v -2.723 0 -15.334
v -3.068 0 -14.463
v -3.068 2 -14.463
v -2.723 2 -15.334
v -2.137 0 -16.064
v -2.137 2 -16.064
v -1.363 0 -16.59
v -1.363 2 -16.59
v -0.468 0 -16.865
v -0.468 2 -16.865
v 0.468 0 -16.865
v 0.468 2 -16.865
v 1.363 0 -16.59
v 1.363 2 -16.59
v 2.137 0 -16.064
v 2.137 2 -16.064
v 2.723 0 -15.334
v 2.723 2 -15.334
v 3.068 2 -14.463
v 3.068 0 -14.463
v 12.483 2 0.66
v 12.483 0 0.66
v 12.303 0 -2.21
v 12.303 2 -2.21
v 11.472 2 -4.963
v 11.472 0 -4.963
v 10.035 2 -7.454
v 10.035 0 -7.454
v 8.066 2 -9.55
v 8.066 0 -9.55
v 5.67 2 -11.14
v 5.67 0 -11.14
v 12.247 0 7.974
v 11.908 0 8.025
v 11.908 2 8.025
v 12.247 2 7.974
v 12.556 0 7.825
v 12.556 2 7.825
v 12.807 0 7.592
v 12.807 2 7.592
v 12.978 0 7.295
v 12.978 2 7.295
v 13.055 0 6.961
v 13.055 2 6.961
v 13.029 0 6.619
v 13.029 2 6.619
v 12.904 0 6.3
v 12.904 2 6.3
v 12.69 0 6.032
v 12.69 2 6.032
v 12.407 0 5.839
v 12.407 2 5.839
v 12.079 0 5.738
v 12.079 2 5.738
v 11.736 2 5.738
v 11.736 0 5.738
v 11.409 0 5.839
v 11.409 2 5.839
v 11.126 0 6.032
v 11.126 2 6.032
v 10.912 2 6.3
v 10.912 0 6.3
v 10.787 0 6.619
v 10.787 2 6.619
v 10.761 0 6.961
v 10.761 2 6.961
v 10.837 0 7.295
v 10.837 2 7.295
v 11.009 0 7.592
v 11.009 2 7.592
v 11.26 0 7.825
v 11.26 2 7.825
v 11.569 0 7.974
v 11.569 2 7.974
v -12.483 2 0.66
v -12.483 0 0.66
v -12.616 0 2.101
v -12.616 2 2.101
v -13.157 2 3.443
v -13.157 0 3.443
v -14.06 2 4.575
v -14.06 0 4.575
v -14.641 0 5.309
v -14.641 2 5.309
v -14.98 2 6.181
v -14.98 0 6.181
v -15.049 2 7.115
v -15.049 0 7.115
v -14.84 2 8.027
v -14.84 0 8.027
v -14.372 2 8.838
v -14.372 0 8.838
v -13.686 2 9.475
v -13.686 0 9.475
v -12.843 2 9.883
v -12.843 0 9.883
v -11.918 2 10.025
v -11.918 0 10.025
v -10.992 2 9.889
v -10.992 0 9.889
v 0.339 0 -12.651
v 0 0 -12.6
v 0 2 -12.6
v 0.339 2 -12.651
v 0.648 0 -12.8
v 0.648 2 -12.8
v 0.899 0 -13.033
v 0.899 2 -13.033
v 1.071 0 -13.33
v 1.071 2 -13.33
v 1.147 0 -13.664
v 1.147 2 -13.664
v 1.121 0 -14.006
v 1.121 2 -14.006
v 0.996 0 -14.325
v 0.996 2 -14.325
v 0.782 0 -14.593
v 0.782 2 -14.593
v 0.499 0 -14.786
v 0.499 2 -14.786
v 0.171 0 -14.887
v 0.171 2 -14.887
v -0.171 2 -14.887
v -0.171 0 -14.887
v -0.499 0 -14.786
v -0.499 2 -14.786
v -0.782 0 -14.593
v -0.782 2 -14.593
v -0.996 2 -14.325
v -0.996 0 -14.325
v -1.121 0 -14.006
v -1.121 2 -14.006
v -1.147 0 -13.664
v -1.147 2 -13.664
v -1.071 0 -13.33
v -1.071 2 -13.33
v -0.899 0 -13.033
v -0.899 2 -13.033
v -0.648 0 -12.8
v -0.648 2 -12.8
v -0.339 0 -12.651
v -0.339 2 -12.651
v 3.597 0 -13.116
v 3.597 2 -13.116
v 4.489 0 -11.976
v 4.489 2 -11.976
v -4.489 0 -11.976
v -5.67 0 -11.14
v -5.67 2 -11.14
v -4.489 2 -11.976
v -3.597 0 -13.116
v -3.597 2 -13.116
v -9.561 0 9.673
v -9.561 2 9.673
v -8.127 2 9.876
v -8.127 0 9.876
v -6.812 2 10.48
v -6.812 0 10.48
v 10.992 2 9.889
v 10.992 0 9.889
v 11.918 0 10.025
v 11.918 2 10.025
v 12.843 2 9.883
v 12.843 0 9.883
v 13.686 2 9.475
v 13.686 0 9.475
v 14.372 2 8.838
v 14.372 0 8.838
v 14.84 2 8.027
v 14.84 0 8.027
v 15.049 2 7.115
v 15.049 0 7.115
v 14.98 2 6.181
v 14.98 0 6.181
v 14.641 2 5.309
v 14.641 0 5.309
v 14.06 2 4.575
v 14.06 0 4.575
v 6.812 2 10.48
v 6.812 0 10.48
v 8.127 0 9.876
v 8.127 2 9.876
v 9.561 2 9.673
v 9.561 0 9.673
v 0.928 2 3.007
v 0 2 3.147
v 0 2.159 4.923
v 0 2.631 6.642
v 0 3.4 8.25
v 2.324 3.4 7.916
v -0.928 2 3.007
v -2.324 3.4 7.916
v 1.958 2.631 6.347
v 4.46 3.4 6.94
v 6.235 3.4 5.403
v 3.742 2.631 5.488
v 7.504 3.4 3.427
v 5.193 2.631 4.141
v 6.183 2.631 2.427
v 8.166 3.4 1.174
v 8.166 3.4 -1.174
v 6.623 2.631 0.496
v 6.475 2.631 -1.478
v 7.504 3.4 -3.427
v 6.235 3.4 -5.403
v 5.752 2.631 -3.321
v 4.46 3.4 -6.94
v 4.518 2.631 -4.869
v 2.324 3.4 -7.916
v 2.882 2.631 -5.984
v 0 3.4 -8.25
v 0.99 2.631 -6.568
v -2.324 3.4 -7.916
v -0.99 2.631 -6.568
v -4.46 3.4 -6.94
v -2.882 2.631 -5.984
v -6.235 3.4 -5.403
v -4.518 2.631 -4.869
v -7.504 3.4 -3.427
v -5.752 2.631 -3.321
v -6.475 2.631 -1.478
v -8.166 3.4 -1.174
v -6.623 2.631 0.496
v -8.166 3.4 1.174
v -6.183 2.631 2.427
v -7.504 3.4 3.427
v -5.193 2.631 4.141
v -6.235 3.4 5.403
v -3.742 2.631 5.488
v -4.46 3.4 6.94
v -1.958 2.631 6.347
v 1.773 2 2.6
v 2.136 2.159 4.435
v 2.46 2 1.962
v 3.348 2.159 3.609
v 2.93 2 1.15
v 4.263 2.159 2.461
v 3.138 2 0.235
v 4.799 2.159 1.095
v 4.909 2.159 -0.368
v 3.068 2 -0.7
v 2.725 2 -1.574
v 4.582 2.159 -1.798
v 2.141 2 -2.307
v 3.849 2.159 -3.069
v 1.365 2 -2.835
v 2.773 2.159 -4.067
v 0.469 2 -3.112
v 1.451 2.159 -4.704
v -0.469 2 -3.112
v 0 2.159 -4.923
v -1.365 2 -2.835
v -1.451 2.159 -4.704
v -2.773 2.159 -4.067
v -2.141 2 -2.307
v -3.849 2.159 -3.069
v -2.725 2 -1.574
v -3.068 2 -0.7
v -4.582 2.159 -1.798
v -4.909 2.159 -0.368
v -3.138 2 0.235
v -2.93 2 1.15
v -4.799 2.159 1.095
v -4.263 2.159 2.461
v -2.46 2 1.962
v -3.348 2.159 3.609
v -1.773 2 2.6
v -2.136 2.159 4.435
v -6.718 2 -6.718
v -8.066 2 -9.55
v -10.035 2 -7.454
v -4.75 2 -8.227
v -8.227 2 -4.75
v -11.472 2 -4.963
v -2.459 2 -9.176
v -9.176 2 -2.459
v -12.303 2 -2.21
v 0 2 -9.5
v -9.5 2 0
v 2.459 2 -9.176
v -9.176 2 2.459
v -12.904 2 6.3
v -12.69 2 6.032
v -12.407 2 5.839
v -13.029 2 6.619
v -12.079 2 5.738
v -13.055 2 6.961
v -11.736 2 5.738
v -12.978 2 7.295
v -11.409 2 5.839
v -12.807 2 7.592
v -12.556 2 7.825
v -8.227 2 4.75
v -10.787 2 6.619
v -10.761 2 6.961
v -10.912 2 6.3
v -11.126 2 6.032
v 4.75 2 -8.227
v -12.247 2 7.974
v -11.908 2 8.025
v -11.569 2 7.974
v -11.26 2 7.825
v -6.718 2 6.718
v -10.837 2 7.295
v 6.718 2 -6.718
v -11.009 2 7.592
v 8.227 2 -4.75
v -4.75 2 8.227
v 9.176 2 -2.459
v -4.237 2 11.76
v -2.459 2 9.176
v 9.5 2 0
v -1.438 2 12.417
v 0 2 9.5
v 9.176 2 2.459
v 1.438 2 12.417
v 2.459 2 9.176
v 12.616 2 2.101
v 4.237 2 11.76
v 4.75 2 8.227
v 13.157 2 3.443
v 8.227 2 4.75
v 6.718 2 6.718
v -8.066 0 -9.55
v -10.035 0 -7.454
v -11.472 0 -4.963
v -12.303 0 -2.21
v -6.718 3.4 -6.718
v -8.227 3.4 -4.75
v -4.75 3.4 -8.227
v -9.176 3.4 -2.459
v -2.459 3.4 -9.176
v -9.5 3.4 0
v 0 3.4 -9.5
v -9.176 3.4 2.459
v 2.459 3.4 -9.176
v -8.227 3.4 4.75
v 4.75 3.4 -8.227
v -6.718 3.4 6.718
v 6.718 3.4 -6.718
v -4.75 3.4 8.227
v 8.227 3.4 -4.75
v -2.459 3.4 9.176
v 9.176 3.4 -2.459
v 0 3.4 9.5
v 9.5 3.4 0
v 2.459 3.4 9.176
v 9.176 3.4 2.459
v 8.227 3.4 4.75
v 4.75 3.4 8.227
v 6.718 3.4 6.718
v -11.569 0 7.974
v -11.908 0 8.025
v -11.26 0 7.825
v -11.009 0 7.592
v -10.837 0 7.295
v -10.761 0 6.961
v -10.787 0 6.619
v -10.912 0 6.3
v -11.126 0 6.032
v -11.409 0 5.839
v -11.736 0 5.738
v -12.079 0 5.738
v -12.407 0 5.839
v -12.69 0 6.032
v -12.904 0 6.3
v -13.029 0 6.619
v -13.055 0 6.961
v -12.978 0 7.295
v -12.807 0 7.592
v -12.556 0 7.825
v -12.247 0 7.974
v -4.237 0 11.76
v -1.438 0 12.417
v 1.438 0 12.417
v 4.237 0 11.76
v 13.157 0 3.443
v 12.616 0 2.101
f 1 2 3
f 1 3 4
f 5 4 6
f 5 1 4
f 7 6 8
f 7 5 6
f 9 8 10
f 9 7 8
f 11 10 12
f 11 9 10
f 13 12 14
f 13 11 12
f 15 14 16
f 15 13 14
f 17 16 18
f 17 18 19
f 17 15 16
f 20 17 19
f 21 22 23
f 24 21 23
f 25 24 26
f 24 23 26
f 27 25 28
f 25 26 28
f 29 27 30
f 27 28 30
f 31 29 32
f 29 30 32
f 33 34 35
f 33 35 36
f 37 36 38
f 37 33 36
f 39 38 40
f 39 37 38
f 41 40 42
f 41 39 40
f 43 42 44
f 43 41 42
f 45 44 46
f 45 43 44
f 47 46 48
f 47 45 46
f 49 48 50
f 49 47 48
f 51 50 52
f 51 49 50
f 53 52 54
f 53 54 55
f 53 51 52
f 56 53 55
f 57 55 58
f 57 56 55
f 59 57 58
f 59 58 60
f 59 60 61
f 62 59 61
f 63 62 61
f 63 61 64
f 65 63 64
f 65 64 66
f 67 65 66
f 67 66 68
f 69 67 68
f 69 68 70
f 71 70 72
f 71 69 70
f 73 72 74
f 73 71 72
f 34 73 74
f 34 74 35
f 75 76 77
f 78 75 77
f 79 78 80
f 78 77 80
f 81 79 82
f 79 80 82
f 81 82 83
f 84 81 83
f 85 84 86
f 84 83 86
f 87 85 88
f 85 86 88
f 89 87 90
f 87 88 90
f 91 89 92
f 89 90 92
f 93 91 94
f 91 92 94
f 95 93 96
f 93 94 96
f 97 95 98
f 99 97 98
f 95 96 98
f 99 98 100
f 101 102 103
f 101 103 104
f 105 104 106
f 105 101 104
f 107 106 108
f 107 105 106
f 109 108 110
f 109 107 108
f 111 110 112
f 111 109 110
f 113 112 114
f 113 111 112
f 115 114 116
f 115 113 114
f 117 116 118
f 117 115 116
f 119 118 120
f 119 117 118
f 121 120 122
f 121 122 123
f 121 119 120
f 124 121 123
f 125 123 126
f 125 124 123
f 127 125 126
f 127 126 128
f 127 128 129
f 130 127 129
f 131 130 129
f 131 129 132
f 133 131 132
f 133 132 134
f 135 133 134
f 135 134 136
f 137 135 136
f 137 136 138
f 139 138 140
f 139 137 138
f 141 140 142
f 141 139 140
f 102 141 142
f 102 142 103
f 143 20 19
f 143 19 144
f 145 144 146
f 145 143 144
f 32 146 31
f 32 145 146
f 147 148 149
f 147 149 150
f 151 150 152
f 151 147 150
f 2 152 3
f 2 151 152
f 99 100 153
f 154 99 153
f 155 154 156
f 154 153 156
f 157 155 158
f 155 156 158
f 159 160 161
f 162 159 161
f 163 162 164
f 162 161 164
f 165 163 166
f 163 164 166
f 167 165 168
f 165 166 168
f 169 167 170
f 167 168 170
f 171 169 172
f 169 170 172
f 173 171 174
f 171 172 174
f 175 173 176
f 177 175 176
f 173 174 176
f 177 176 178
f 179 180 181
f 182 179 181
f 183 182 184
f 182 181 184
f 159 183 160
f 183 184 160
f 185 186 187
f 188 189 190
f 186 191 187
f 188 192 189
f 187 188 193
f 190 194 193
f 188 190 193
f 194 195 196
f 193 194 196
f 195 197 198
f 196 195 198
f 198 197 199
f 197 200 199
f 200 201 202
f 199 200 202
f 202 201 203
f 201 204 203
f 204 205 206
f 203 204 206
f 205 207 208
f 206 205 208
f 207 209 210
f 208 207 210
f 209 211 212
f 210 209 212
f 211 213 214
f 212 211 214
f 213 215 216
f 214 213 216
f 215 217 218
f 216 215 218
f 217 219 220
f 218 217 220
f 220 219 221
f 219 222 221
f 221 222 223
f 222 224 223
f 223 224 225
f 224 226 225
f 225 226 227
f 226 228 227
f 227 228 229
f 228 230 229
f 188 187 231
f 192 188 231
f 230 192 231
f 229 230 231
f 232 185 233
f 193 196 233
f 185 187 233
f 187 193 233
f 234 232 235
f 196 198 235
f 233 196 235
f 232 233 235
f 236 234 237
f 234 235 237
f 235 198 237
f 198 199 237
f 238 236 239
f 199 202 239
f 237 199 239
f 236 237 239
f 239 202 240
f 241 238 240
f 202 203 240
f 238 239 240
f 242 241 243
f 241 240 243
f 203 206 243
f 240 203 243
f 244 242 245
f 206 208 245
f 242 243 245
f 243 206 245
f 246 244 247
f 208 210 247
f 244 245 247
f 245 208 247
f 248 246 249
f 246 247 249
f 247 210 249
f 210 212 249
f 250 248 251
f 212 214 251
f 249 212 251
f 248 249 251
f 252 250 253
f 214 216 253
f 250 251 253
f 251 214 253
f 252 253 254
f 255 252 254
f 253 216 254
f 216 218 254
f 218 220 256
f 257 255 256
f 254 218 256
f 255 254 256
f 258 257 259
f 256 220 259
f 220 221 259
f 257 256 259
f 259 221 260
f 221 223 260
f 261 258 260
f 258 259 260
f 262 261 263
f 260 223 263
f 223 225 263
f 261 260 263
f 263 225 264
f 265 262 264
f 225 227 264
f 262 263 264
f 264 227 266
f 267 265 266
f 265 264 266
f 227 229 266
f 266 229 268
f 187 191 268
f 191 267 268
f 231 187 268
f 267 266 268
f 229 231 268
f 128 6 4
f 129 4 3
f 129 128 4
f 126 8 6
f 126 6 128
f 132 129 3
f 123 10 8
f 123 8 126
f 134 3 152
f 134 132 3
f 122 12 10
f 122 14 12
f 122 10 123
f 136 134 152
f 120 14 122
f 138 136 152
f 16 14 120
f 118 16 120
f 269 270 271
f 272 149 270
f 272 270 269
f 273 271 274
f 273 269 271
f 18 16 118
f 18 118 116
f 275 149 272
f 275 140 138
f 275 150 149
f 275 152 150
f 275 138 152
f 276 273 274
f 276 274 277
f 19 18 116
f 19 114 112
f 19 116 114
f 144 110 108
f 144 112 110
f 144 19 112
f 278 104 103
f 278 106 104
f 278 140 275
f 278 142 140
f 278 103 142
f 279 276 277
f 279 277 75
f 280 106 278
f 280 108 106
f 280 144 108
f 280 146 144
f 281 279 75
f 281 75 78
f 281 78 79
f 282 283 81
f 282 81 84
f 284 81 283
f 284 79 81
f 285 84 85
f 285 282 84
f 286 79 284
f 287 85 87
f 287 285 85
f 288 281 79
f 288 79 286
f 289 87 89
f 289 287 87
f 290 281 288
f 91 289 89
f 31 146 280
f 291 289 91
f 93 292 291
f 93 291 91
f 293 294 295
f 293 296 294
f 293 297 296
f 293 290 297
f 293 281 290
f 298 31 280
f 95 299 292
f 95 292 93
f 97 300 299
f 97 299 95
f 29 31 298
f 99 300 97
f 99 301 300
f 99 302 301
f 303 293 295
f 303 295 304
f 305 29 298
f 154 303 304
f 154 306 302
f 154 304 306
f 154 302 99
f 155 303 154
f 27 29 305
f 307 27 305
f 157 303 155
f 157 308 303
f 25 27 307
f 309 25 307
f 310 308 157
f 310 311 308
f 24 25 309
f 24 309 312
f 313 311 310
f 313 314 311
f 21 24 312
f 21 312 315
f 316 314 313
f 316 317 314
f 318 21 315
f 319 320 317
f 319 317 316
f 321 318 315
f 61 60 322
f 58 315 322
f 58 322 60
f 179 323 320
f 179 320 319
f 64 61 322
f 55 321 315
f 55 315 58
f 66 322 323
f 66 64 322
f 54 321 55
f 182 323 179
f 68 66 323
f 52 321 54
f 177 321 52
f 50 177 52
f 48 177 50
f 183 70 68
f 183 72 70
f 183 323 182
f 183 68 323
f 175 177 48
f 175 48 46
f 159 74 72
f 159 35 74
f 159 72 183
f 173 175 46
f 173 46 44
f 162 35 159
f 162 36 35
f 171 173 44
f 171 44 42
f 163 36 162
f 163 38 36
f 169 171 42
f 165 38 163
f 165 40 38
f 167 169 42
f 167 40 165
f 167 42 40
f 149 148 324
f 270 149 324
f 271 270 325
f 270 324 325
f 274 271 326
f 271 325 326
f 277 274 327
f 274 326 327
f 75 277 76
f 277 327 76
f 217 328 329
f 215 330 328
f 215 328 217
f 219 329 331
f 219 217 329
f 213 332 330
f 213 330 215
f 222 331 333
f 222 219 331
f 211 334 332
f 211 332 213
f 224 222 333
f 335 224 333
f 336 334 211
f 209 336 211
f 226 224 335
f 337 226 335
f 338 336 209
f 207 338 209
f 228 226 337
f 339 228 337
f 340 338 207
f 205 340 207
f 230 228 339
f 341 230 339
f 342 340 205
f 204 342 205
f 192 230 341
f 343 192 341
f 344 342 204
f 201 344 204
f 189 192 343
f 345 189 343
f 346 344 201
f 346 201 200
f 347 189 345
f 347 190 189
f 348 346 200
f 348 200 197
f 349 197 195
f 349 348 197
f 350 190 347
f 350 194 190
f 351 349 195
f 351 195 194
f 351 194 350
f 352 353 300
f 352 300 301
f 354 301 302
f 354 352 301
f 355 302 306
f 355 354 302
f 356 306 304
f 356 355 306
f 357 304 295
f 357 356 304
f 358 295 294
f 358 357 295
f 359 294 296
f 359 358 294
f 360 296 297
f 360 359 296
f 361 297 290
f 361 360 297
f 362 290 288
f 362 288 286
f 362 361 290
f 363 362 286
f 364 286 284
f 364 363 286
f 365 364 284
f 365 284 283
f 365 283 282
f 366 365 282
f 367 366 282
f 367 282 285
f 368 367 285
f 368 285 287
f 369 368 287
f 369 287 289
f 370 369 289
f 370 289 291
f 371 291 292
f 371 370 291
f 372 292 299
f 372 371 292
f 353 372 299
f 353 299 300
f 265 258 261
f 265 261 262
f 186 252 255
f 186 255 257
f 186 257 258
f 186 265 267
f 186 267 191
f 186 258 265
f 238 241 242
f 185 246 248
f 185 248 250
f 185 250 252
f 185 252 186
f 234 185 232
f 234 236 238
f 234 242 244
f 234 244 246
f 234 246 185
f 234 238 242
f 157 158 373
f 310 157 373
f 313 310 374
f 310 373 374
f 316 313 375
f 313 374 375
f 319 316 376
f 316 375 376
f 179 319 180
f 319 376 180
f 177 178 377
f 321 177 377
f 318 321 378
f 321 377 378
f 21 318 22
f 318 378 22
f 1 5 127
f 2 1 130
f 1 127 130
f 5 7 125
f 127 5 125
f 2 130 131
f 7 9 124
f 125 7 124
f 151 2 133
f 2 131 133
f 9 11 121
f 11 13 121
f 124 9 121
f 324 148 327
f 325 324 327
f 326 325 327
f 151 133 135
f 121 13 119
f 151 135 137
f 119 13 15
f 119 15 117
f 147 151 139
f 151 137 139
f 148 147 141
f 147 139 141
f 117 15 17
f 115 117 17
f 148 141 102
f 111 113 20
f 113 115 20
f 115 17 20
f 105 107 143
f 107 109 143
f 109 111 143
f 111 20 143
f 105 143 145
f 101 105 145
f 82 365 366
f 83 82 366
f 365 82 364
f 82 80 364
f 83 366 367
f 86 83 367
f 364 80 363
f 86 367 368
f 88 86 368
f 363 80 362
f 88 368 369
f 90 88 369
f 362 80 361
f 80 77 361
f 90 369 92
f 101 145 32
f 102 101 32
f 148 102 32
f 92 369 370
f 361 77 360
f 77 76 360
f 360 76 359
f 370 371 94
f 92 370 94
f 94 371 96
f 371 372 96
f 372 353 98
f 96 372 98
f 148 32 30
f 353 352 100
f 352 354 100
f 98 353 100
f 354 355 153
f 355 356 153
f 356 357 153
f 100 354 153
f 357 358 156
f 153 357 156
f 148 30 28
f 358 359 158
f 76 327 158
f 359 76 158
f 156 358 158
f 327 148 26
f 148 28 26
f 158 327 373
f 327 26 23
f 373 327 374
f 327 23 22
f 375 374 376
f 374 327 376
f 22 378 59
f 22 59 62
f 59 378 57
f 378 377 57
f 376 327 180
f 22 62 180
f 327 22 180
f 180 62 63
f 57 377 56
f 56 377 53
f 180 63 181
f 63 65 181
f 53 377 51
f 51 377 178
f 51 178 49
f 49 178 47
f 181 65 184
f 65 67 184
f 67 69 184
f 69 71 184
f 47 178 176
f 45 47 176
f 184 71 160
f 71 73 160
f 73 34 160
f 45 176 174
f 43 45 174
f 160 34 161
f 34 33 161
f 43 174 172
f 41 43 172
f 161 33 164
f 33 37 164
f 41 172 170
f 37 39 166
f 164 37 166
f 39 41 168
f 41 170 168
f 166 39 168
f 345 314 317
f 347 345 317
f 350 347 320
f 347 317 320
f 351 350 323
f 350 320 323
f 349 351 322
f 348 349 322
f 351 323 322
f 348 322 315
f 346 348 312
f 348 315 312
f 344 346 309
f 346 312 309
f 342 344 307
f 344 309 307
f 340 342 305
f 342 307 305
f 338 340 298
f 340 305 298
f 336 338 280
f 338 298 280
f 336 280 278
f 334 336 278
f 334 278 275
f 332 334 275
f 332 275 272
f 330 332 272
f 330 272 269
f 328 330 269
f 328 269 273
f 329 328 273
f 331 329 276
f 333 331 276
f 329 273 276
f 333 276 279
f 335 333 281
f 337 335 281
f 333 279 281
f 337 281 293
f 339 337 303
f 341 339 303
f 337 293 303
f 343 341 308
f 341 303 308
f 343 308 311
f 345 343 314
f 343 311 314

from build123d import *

# Parameters (mm, degrees)
SKETCH_1_R      = 12.5
EXTRUDE_1_DEPTH = 2
SKETCH_2_R      = 9.5
SKETCH_2_R_2    = 8.25
EXTRUDE_2_DEPTH = 1.4
FILLET_1_R      = 10
EXTRUDE_START   = -2
SKETCH_3_R      = 1.15
EXTRUDE_3_DEPTH = 2


with BuildPart() as part:
    # Эскиз1 → Бобышка-Вытянуть1 (new body)
    with BuildSketch(Plane(origin=(0, 0, 0), x_dir=(1, 0, 0), z_dir=(0, 1, 0))):
        with Locations(Location((0, 0, 0), (0, 0, 270))):
            Circle(SKETCH_1_R)
    extrude(amount=EXTRUDE_1_DEPTH)

    # Эскиз2 → Бобышка-Вытянуть2 (add)
    with BuildSketch(Plane(origin=(0, 2, 0), x_dir=(1, 0, 0), z_dir=(0, 1, 0))):
        with Locations(Location((0, 0, 0), (0, 0, 270))):
            Circle(SKETCH_2_R)
        with Locations(Location((0, 0, 0), (0, 0, 270))):
            Circle(SKETCH_2_R_2, mode=Mode.SUBTRACT)
    extrude(amount=EXTRUDE_2_DEPTH)

    # Скругление1
    # the kernel refuses this fillet: 10 mm, written as the material it adds along each edge
    with BuildSketch(Plane(origin=(0, 2, 0), x_dir=(0, 0, 1), z_dir=(-1, 0, 0))) as fillet_1_piece_1:
        with BuildLine():
            CenterArc((3.147059671, 10), FILLET_1_R, 270, 30.683417109)
            Line((3.147059671, 0), (3.147059671, -0.2))
            Line((3.147059671, -0.2), (8.25, -0.2))
            Line((8.25, -0.2), (8.45, 0))
            ThreePointArc((8.45, 0), (8.45, 0.7), (8.352058807, 1.228))
            Line((8.352058807, 1.228), (8.25, 1.4))
        make_face()
    revolve(axis=Axis((0, 2, 0), (0, 1, 0)))

    # Эскиз3 → Бобышка-Вытянуть3 (add)
    # profile 1 of 3: a face of its own
    with BuildSketch(Plane(origin=(0, 2, 0), x_dir=(1, 0, 0), z_dir=(0, 1, 0)).offset(EXTRUDE_START)):
        with BuildLine():
            ThreePointArc((5.670132274, 11.14), (0, 12.5), (-5.670132274, 11.14))
            ThreePointArc((-5.670132274, 11.14), (-4.001241708, 12.51371577), (-3.068132924, 14.463484663))
            ThreePointArc((-3.068132924, 14.463484663), (0, 16.9), (3.068132924, 14.463484663))
            ThreePointArc((3.068132924, 14.463484663), (4.001241708, 12.51371577), (5.670132274, 11.14))
        make_face()
        with Locations(Location((0, 13.75, 0), (0, 0, 270))):
            Circle(SKETCH_3_R, mode=Mode.SUBTRACT)
    # profile 2 of 3: a face of its own
    with BuildSketch(Plane(origin=(0, 2, 0), x_dir=(1, 0, 0), z_dir=(0, 1, 0)).offset(EXTRUDE_START)):
        with BuildLine():
            ThreePointArc((10.991678683, -9.888823385), (14.635829324, -8.45), (14.059811607, -4.574661277))
            ThreePointArc((14.059811607, -4.574661277), (12.837816607, -2.791680919), (12.482589135, -0.659521408))
            ThreePointArc((12.482589135, -0.659521408), (10.825317547, -6.25), (6.812456861, -10.480478592))
            ThreePointArc((6.812456861, -10.480478592), (8.836574899, -9.722034851), (10.991678683, -9.888823385))
        make_face()
        with Locations(Location((11.907849302, -6.875, 0), (0, 0, 270))):
            Circle(SKETCH_3_R, mode=Mode.SUBTRACT)
    # profile 3 of 3: a face of its own
    with BuildSketch(Plane(origin=(0, 2, 0), x_dir=(1, 0, 0), z_dir=(0, 1, 0)).offset(EXTRUDE_START)):
        with BuildLine():
            ThreePointArc((-14.059811607, -4.574661277), (-14.635829324, -8.45), (-10.991678683, -9.888823385))
            ThreePointArc((-10.991678683, -9.888823385), (-8.836574899, -9.722034851), (-6.812456861, -10.480478592))
            ThreePointArc((-6.812456861, -10.480478592), (-10.825317547, -6.25), (-12.482589135, -0.659521408))
            ThreePointArc((-12.482589135, -0.659521408), (-12.837816607, -2.791680919), (-14.059811607, -4.574661277))
        make_face()
        with Locations(Location((-11.907849302, -6.875, 0), (0, 0, 270))):
            Circle(SKETCH_3_R, mode=Mode.SUBTRACT)
    extrude(amount=EXTRUDE_3_DEPTH)


solid = part.part
